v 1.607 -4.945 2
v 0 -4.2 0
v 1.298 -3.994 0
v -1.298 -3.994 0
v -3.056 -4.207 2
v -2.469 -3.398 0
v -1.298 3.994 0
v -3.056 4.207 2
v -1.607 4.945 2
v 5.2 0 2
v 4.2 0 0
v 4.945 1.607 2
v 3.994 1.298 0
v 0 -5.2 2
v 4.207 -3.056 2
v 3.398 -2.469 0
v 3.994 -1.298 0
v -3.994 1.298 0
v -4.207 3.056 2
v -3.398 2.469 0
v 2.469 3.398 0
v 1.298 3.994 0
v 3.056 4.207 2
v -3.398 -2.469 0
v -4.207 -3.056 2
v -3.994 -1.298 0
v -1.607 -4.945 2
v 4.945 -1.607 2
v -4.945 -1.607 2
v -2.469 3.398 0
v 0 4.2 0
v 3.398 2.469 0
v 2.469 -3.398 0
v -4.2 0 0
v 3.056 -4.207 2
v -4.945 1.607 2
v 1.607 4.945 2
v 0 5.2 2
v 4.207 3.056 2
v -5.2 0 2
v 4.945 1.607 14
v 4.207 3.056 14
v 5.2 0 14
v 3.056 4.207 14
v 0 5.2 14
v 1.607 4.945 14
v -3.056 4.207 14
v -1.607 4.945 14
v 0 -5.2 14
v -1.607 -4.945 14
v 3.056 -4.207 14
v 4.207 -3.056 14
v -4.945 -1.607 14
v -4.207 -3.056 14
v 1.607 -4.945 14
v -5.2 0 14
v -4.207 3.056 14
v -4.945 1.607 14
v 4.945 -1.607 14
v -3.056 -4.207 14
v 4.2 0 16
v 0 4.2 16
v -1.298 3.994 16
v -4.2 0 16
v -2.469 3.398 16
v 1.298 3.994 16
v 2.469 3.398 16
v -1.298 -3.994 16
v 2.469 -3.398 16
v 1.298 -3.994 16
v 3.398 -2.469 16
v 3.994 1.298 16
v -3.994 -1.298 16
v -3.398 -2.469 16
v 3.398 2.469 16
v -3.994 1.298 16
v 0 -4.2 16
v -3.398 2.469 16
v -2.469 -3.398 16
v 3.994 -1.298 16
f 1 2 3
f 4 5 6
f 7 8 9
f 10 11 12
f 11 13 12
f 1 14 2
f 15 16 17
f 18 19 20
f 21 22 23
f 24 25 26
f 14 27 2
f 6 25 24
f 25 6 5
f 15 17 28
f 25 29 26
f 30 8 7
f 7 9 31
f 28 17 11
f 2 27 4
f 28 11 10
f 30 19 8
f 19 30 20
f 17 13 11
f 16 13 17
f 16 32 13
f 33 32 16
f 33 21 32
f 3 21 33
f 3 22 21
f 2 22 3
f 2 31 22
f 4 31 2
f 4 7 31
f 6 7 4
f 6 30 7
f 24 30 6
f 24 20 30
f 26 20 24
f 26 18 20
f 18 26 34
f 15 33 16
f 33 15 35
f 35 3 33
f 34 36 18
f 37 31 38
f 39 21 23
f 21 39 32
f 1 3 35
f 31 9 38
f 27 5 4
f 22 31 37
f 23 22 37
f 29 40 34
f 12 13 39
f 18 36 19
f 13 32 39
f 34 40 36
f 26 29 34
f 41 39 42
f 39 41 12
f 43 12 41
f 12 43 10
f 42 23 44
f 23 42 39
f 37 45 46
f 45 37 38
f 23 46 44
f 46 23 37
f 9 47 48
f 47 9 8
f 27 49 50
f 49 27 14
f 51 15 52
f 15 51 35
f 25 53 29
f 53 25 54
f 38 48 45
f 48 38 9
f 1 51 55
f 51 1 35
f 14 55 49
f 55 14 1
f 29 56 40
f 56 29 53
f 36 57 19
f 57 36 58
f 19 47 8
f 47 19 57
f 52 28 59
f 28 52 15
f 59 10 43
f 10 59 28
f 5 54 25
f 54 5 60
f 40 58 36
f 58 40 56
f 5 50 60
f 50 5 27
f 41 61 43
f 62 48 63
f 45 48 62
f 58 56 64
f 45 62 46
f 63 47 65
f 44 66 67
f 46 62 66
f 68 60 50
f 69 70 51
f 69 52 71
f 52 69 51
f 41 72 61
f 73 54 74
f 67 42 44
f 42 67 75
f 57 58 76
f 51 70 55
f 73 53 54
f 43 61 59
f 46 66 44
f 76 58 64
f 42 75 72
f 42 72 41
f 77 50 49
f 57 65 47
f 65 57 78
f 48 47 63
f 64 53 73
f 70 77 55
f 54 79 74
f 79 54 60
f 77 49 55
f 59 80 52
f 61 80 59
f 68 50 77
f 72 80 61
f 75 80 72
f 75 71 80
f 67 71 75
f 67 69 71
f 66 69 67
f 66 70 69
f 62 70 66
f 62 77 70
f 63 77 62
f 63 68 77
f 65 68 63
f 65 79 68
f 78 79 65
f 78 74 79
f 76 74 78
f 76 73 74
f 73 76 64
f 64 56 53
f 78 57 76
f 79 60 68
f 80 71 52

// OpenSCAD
d=10.4;
h=16;

cylinder(2,d/2-1,d/2,$fn=20);
translate([0,0,2]) cylinder(h-4,d/2,d/2,$fn=20);
translate([0,0,h-2]) cylinder(2,d/2,d/2-1,$fn=20);
